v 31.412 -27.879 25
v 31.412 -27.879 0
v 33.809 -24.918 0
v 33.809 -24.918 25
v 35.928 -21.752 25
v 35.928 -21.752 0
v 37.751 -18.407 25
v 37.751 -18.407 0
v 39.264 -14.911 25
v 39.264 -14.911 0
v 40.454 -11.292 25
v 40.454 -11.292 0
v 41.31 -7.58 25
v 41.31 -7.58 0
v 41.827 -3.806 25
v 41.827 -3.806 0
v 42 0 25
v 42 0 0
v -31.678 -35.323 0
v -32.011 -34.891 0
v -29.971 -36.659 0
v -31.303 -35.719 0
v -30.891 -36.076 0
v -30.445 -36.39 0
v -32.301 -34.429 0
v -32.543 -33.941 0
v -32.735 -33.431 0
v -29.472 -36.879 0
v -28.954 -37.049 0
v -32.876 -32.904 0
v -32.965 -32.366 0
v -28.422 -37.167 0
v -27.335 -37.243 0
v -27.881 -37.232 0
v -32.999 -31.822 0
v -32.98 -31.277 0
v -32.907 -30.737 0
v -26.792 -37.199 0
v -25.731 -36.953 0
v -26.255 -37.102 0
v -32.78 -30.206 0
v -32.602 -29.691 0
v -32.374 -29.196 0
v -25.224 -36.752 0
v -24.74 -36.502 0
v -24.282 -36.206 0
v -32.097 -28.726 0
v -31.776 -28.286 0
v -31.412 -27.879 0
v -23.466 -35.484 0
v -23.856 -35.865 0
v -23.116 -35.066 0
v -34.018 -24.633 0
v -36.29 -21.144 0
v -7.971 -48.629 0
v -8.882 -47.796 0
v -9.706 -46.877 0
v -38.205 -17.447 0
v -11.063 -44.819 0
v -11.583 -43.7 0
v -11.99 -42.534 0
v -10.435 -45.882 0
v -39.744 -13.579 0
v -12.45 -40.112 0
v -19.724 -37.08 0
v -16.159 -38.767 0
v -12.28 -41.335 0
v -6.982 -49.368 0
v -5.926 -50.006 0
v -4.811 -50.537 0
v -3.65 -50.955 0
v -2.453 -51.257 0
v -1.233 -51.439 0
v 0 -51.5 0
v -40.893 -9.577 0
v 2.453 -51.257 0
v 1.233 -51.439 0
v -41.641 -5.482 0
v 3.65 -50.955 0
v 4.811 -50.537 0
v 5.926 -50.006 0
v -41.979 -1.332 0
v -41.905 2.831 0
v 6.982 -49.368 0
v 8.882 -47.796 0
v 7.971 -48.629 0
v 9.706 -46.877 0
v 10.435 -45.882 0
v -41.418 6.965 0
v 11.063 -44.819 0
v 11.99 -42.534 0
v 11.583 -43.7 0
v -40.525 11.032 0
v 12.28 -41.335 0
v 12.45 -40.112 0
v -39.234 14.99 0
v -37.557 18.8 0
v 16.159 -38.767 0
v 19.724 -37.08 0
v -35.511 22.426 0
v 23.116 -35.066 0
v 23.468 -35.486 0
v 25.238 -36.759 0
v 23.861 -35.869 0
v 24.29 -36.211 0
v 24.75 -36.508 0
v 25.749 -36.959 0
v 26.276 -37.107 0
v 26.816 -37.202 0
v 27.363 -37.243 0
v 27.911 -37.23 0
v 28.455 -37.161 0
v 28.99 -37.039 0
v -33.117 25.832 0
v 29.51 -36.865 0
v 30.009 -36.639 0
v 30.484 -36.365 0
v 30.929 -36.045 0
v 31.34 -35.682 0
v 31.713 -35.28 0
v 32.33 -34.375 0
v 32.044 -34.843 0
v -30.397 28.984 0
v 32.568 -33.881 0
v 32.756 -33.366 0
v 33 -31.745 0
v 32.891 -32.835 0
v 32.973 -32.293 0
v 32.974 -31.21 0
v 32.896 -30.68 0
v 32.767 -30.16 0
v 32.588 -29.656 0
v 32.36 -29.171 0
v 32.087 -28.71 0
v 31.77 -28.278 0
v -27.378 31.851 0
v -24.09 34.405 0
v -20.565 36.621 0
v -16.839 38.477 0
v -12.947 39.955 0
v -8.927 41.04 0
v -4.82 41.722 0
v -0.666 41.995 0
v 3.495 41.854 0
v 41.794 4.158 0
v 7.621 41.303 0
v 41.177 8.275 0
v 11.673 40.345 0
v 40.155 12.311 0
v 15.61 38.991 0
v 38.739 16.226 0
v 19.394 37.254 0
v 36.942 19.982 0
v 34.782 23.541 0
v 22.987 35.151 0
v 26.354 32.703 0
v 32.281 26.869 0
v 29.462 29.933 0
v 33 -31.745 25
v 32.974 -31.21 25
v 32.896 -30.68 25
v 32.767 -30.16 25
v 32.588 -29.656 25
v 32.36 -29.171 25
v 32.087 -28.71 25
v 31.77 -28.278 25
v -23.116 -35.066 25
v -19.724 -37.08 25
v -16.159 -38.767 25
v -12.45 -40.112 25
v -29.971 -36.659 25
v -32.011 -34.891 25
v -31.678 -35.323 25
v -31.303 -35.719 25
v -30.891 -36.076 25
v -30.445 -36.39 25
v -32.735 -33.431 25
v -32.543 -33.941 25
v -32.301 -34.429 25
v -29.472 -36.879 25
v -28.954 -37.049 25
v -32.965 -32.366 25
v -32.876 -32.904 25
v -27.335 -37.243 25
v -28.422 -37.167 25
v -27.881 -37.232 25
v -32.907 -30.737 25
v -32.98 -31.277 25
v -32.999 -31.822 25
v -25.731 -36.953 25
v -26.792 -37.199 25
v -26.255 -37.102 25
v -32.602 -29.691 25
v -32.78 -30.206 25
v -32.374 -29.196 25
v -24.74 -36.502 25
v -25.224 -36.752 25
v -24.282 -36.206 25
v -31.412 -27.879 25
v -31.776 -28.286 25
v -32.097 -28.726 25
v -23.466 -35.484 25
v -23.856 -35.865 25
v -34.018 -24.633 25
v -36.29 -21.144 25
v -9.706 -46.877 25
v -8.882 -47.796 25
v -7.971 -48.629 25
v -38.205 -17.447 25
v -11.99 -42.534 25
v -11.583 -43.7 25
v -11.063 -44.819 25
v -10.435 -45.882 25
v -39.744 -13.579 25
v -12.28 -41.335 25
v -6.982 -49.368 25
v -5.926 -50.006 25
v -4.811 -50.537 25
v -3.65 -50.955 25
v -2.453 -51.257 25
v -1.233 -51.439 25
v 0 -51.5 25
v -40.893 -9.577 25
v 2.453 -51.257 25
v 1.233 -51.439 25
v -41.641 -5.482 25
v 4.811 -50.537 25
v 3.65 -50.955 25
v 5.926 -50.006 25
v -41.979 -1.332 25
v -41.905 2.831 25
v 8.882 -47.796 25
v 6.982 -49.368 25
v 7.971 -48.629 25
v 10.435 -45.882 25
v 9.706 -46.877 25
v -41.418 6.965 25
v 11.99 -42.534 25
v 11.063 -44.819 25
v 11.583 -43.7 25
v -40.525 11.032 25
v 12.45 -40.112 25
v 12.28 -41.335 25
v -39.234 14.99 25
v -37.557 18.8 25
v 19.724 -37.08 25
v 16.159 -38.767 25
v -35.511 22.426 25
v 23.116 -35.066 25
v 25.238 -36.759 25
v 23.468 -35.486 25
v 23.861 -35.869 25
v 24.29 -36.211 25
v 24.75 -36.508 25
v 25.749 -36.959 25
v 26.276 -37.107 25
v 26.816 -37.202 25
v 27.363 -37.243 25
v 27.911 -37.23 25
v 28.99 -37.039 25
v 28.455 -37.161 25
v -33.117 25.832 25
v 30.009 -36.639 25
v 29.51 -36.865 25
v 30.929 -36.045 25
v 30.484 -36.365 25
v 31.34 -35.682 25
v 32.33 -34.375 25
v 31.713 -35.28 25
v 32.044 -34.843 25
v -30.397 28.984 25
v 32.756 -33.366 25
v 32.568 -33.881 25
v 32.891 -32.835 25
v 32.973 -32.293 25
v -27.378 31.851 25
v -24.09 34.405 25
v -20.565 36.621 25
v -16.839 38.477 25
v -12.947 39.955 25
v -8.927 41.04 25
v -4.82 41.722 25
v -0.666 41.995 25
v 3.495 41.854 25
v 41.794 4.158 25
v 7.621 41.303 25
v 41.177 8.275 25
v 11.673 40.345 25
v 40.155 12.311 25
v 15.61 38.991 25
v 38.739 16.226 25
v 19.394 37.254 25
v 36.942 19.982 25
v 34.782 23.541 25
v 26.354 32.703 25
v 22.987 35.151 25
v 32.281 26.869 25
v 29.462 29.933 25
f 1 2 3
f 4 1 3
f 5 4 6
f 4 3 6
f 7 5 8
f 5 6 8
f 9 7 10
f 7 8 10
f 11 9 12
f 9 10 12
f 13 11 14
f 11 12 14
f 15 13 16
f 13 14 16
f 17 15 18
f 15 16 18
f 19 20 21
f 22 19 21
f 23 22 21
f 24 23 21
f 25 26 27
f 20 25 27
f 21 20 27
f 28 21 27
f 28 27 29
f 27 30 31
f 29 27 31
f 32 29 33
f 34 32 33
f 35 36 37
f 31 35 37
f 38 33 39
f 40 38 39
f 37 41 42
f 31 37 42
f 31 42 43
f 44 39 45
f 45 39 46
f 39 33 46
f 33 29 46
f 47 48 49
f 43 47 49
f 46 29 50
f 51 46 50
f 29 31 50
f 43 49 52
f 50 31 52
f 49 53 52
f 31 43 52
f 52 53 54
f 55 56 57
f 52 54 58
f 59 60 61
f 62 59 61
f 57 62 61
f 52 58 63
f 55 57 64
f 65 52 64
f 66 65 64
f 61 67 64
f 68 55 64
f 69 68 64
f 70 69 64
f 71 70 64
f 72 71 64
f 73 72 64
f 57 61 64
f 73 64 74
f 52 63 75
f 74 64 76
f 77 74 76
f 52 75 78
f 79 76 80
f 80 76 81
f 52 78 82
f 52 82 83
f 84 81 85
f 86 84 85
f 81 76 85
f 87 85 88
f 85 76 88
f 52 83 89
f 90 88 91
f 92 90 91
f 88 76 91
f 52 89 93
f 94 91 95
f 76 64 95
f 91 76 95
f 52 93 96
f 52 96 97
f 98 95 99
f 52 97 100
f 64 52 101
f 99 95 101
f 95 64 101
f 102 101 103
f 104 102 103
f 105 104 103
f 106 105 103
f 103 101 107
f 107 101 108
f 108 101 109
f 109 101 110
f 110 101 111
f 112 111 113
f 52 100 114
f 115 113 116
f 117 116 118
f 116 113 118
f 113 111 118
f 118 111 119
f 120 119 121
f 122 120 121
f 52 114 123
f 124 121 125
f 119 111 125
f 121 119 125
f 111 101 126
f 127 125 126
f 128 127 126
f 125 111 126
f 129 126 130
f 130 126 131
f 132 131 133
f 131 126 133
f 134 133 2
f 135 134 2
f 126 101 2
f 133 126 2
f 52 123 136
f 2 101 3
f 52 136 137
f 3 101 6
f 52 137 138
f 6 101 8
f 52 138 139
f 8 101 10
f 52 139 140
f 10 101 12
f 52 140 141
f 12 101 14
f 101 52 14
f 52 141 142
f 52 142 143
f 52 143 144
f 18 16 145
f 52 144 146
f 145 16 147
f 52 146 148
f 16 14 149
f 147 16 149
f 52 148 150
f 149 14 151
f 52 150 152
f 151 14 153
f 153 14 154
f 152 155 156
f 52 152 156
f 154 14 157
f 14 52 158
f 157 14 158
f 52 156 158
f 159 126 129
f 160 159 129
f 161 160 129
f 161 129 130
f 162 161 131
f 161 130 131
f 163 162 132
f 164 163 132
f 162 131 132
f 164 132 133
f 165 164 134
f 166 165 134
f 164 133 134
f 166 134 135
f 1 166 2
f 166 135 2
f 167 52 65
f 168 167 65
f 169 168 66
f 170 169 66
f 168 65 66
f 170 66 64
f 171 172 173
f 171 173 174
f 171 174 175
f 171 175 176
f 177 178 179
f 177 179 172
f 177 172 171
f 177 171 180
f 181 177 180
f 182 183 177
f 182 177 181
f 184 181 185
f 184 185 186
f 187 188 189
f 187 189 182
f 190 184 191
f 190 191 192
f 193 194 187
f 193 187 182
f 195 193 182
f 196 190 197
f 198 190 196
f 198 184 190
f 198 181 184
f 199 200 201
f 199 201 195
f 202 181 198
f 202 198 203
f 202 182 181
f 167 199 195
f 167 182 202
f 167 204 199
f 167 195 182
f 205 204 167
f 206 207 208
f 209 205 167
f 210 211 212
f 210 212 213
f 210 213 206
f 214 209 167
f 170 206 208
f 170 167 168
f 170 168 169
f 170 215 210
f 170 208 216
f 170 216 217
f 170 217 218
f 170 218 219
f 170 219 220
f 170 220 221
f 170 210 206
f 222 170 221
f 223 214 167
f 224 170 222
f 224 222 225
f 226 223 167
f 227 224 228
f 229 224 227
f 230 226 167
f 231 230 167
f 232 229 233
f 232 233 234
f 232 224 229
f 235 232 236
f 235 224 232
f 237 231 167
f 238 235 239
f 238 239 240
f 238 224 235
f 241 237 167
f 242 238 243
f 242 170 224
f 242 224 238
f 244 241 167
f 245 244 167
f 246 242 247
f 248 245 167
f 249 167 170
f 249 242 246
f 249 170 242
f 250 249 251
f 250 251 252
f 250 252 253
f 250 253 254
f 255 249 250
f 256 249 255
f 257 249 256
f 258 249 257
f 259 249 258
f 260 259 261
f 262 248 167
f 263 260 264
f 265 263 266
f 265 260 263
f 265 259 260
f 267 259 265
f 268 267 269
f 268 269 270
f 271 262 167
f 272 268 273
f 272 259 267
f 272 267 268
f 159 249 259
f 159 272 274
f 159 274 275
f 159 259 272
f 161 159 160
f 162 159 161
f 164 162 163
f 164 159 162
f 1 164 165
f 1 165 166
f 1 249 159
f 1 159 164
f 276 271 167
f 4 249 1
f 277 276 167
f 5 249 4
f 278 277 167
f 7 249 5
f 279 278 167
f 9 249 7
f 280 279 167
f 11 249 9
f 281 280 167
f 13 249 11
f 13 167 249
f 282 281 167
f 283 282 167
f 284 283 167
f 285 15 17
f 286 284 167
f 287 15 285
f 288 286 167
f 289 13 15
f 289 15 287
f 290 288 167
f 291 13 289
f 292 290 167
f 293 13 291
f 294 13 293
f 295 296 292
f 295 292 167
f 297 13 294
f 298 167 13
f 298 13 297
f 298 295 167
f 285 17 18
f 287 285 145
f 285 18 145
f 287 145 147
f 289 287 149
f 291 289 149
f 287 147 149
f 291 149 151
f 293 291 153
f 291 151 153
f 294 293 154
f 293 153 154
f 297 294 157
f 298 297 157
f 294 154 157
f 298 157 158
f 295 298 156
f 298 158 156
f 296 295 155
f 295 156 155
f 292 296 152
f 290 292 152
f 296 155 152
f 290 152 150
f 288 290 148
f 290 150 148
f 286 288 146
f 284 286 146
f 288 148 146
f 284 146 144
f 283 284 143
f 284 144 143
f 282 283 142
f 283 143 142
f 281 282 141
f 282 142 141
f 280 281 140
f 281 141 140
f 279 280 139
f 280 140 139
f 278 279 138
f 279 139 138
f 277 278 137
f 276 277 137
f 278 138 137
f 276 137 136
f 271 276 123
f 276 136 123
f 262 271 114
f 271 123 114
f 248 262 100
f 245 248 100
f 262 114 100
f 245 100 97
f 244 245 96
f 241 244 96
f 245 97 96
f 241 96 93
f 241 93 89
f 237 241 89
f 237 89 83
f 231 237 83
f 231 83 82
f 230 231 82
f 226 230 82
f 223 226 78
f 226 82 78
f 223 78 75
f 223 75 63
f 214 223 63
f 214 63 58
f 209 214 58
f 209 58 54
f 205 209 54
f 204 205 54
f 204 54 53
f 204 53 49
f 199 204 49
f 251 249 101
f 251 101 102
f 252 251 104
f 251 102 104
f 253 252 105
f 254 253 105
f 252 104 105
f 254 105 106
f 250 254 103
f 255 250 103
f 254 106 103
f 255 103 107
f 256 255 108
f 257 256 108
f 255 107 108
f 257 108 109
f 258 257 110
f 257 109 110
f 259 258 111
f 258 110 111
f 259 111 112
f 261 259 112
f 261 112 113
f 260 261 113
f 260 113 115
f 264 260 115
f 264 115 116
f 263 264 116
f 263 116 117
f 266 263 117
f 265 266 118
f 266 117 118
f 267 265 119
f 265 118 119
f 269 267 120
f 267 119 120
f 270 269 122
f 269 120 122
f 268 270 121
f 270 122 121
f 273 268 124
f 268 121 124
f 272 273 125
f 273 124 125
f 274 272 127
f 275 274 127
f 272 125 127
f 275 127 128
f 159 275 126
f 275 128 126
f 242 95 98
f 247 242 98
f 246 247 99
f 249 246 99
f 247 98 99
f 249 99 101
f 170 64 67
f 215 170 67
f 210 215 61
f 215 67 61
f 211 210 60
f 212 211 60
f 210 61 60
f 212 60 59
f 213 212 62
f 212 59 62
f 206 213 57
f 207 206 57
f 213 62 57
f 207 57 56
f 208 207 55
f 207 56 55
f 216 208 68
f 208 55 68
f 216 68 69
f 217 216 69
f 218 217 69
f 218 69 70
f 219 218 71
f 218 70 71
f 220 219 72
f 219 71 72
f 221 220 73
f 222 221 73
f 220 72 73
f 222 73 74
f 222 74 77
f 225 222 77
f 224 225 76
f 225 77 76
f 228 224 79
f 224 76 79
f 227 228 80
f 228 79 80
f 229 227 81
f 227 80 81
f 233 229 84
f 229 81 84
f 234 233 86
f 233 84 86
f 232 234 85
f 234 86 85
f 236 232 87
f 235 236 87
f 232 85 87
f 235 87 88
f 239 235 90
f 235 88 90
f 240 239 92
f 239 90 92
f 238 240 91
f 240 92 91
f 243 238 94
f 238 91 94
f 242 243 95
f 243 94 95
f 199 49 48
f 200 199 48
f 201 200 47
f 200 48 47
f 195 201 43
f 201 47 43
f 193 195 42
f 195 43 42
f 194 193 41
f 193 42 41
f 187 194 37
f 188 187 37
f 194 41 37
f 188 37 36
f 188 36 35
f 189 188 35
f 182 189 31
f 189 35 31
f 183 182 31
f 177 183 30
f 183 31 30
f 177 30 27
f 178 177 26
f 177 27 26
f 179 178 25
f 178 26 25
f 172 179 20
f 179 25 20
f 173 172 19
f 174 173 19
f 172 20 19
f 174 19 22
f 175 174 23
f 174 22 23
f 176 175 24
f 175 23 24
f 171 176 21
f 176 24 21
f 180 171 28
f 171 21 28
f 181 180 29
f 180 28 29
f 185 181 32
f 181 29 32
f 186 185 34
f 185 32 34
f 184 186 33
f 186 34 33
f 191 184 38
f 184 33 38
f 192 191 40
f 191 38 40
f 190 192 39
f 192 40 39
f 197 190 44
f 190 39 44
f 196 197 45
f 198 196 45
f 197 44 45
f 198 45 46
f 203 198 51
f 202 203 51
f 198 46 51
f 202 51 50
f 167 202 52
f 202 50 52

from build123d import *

# Parameters (mm, degrees)
F1_DEPTH = 25


with BuildPart() as f1:
    # F0 (on Top) → F1 (new body)
    with BuildSketch(Plane.XY):
        with BuildLine():
            ThreePointArc((31.4123807864, -27.8794249104), (39.2639783582, -14.9110698304), (42, 0))
            ThreePointArc((42, 0), (-14.9110698304, 39.2639783582), (-31.4123807864, -27.8794249104))
            ThreePointArc((-31.4123807864, -27.8794249104), (-25.4105137384, -26.6574416615), (-22, -31.7450783587))
            ThreePointArc((-22, -31.7450783587), (-22.2864690998, -33.4969617889), (-23.1160347465, -35.066350503))
            ThreePointArc((-23.1160347465, -35.066350503), (-17.9613012827, -37.9656641748), (-12.4504239602, -40.1121794872))
            ThreePointArc((-12.4504239602, -40.1121794872), (-0.5566419395, -26.5124001605), (12.5, -39))
            ThreePointArc((12.5, -39), (12.4875998395, -39.5566419395), (12.4504239602, -40.1121794872))
            ThreePointArc((12.4504239602, -40.1121794872), (17.9613012827, -37.9656641748), (23.1160347465, -35.066350503))
            ThreePointArc((23.1160347465, -35.066350503), (23.8988095238, -27.5879847641), (31.4123807864, -27.8794249104))
        make_face()
        with BuildLine():
            ThreePointArc((-22, -31.7450783587), (-25.4105137384, -26.6574416615), (-31.4123807864, -27.8794249104))
            ThreePointArc((-31.4123807864, -27.8794249104), (-27.5, -31.7450783587), (-23.1160347465, -35.066350503))
            ThreePointArc((-23.1160347465, -35.066350503), (-22.2864690998, -33.4969617889), (-22, -31.7450783587))
        make_face()
        with BuildLine():
            ThreePointArc((-23.1160347465, -35.066350503), (-27.5, -31.7450783587), (-31.4123807864, -27.8794249104))
            ThreePointArc((-31.4123807864, -27.8794249104), (-31.1011904762, -35.9021719533), (-23.1160347465, -35.066350503))
        make_face()
        with BuildLine():
            ThreePointArc((33, -31.7450783587), (32.5876366972, -29.6555920971), (31.4123807864, -27.8794249104))
            ThreePointArc((31.4123807864, -27.8794249104), (27.5, -31.7450783587), (23.1160347465, -35.066350503))
            ThreePointArc((23.1160347465, -35.066350503), (29.2518834302, -36.9586092589), (33, -31.7450783587))
        make_face()
        with BuildLine():
            ThreePointArc((23.1160347465, -35.066350503), (27.5, -31.7450783587), (31.4123807864, -27.8794249104))
            ThreePointArc((31.4123807864, -27.8794249104), (23.8988095238, -27.5879847641), (23.1160347465, -35.066350503))
        make_face()
        with BuildLine():
            ThreePointArc((12.5, -39), (-0.5566419395, -26.5124001605), (-12.4504239602, -40.1121794872))
            ThreePointArc((-12.4504239602, -40.1121794872), (0, -42), (12.4504239602, -40.1121794872))
            ThreePointArc((12.4504239602, -40.1121794872), (12.4875998395, -39.5566419395), (12.5, -39))
        make_face()
        with BuildLine():
            ThreePointArc((12.4504239602, -40.1121794872), (0, -42), (-12.4504239602, -40.1121794872))
            ThreePointArc((-12.4504239602, -40.1121794872), (0, -51.5), (12.4504239602, -40.1121794872))
        make_face()
    extrude(amount=F1_DEPTH)


solid = f1.part
